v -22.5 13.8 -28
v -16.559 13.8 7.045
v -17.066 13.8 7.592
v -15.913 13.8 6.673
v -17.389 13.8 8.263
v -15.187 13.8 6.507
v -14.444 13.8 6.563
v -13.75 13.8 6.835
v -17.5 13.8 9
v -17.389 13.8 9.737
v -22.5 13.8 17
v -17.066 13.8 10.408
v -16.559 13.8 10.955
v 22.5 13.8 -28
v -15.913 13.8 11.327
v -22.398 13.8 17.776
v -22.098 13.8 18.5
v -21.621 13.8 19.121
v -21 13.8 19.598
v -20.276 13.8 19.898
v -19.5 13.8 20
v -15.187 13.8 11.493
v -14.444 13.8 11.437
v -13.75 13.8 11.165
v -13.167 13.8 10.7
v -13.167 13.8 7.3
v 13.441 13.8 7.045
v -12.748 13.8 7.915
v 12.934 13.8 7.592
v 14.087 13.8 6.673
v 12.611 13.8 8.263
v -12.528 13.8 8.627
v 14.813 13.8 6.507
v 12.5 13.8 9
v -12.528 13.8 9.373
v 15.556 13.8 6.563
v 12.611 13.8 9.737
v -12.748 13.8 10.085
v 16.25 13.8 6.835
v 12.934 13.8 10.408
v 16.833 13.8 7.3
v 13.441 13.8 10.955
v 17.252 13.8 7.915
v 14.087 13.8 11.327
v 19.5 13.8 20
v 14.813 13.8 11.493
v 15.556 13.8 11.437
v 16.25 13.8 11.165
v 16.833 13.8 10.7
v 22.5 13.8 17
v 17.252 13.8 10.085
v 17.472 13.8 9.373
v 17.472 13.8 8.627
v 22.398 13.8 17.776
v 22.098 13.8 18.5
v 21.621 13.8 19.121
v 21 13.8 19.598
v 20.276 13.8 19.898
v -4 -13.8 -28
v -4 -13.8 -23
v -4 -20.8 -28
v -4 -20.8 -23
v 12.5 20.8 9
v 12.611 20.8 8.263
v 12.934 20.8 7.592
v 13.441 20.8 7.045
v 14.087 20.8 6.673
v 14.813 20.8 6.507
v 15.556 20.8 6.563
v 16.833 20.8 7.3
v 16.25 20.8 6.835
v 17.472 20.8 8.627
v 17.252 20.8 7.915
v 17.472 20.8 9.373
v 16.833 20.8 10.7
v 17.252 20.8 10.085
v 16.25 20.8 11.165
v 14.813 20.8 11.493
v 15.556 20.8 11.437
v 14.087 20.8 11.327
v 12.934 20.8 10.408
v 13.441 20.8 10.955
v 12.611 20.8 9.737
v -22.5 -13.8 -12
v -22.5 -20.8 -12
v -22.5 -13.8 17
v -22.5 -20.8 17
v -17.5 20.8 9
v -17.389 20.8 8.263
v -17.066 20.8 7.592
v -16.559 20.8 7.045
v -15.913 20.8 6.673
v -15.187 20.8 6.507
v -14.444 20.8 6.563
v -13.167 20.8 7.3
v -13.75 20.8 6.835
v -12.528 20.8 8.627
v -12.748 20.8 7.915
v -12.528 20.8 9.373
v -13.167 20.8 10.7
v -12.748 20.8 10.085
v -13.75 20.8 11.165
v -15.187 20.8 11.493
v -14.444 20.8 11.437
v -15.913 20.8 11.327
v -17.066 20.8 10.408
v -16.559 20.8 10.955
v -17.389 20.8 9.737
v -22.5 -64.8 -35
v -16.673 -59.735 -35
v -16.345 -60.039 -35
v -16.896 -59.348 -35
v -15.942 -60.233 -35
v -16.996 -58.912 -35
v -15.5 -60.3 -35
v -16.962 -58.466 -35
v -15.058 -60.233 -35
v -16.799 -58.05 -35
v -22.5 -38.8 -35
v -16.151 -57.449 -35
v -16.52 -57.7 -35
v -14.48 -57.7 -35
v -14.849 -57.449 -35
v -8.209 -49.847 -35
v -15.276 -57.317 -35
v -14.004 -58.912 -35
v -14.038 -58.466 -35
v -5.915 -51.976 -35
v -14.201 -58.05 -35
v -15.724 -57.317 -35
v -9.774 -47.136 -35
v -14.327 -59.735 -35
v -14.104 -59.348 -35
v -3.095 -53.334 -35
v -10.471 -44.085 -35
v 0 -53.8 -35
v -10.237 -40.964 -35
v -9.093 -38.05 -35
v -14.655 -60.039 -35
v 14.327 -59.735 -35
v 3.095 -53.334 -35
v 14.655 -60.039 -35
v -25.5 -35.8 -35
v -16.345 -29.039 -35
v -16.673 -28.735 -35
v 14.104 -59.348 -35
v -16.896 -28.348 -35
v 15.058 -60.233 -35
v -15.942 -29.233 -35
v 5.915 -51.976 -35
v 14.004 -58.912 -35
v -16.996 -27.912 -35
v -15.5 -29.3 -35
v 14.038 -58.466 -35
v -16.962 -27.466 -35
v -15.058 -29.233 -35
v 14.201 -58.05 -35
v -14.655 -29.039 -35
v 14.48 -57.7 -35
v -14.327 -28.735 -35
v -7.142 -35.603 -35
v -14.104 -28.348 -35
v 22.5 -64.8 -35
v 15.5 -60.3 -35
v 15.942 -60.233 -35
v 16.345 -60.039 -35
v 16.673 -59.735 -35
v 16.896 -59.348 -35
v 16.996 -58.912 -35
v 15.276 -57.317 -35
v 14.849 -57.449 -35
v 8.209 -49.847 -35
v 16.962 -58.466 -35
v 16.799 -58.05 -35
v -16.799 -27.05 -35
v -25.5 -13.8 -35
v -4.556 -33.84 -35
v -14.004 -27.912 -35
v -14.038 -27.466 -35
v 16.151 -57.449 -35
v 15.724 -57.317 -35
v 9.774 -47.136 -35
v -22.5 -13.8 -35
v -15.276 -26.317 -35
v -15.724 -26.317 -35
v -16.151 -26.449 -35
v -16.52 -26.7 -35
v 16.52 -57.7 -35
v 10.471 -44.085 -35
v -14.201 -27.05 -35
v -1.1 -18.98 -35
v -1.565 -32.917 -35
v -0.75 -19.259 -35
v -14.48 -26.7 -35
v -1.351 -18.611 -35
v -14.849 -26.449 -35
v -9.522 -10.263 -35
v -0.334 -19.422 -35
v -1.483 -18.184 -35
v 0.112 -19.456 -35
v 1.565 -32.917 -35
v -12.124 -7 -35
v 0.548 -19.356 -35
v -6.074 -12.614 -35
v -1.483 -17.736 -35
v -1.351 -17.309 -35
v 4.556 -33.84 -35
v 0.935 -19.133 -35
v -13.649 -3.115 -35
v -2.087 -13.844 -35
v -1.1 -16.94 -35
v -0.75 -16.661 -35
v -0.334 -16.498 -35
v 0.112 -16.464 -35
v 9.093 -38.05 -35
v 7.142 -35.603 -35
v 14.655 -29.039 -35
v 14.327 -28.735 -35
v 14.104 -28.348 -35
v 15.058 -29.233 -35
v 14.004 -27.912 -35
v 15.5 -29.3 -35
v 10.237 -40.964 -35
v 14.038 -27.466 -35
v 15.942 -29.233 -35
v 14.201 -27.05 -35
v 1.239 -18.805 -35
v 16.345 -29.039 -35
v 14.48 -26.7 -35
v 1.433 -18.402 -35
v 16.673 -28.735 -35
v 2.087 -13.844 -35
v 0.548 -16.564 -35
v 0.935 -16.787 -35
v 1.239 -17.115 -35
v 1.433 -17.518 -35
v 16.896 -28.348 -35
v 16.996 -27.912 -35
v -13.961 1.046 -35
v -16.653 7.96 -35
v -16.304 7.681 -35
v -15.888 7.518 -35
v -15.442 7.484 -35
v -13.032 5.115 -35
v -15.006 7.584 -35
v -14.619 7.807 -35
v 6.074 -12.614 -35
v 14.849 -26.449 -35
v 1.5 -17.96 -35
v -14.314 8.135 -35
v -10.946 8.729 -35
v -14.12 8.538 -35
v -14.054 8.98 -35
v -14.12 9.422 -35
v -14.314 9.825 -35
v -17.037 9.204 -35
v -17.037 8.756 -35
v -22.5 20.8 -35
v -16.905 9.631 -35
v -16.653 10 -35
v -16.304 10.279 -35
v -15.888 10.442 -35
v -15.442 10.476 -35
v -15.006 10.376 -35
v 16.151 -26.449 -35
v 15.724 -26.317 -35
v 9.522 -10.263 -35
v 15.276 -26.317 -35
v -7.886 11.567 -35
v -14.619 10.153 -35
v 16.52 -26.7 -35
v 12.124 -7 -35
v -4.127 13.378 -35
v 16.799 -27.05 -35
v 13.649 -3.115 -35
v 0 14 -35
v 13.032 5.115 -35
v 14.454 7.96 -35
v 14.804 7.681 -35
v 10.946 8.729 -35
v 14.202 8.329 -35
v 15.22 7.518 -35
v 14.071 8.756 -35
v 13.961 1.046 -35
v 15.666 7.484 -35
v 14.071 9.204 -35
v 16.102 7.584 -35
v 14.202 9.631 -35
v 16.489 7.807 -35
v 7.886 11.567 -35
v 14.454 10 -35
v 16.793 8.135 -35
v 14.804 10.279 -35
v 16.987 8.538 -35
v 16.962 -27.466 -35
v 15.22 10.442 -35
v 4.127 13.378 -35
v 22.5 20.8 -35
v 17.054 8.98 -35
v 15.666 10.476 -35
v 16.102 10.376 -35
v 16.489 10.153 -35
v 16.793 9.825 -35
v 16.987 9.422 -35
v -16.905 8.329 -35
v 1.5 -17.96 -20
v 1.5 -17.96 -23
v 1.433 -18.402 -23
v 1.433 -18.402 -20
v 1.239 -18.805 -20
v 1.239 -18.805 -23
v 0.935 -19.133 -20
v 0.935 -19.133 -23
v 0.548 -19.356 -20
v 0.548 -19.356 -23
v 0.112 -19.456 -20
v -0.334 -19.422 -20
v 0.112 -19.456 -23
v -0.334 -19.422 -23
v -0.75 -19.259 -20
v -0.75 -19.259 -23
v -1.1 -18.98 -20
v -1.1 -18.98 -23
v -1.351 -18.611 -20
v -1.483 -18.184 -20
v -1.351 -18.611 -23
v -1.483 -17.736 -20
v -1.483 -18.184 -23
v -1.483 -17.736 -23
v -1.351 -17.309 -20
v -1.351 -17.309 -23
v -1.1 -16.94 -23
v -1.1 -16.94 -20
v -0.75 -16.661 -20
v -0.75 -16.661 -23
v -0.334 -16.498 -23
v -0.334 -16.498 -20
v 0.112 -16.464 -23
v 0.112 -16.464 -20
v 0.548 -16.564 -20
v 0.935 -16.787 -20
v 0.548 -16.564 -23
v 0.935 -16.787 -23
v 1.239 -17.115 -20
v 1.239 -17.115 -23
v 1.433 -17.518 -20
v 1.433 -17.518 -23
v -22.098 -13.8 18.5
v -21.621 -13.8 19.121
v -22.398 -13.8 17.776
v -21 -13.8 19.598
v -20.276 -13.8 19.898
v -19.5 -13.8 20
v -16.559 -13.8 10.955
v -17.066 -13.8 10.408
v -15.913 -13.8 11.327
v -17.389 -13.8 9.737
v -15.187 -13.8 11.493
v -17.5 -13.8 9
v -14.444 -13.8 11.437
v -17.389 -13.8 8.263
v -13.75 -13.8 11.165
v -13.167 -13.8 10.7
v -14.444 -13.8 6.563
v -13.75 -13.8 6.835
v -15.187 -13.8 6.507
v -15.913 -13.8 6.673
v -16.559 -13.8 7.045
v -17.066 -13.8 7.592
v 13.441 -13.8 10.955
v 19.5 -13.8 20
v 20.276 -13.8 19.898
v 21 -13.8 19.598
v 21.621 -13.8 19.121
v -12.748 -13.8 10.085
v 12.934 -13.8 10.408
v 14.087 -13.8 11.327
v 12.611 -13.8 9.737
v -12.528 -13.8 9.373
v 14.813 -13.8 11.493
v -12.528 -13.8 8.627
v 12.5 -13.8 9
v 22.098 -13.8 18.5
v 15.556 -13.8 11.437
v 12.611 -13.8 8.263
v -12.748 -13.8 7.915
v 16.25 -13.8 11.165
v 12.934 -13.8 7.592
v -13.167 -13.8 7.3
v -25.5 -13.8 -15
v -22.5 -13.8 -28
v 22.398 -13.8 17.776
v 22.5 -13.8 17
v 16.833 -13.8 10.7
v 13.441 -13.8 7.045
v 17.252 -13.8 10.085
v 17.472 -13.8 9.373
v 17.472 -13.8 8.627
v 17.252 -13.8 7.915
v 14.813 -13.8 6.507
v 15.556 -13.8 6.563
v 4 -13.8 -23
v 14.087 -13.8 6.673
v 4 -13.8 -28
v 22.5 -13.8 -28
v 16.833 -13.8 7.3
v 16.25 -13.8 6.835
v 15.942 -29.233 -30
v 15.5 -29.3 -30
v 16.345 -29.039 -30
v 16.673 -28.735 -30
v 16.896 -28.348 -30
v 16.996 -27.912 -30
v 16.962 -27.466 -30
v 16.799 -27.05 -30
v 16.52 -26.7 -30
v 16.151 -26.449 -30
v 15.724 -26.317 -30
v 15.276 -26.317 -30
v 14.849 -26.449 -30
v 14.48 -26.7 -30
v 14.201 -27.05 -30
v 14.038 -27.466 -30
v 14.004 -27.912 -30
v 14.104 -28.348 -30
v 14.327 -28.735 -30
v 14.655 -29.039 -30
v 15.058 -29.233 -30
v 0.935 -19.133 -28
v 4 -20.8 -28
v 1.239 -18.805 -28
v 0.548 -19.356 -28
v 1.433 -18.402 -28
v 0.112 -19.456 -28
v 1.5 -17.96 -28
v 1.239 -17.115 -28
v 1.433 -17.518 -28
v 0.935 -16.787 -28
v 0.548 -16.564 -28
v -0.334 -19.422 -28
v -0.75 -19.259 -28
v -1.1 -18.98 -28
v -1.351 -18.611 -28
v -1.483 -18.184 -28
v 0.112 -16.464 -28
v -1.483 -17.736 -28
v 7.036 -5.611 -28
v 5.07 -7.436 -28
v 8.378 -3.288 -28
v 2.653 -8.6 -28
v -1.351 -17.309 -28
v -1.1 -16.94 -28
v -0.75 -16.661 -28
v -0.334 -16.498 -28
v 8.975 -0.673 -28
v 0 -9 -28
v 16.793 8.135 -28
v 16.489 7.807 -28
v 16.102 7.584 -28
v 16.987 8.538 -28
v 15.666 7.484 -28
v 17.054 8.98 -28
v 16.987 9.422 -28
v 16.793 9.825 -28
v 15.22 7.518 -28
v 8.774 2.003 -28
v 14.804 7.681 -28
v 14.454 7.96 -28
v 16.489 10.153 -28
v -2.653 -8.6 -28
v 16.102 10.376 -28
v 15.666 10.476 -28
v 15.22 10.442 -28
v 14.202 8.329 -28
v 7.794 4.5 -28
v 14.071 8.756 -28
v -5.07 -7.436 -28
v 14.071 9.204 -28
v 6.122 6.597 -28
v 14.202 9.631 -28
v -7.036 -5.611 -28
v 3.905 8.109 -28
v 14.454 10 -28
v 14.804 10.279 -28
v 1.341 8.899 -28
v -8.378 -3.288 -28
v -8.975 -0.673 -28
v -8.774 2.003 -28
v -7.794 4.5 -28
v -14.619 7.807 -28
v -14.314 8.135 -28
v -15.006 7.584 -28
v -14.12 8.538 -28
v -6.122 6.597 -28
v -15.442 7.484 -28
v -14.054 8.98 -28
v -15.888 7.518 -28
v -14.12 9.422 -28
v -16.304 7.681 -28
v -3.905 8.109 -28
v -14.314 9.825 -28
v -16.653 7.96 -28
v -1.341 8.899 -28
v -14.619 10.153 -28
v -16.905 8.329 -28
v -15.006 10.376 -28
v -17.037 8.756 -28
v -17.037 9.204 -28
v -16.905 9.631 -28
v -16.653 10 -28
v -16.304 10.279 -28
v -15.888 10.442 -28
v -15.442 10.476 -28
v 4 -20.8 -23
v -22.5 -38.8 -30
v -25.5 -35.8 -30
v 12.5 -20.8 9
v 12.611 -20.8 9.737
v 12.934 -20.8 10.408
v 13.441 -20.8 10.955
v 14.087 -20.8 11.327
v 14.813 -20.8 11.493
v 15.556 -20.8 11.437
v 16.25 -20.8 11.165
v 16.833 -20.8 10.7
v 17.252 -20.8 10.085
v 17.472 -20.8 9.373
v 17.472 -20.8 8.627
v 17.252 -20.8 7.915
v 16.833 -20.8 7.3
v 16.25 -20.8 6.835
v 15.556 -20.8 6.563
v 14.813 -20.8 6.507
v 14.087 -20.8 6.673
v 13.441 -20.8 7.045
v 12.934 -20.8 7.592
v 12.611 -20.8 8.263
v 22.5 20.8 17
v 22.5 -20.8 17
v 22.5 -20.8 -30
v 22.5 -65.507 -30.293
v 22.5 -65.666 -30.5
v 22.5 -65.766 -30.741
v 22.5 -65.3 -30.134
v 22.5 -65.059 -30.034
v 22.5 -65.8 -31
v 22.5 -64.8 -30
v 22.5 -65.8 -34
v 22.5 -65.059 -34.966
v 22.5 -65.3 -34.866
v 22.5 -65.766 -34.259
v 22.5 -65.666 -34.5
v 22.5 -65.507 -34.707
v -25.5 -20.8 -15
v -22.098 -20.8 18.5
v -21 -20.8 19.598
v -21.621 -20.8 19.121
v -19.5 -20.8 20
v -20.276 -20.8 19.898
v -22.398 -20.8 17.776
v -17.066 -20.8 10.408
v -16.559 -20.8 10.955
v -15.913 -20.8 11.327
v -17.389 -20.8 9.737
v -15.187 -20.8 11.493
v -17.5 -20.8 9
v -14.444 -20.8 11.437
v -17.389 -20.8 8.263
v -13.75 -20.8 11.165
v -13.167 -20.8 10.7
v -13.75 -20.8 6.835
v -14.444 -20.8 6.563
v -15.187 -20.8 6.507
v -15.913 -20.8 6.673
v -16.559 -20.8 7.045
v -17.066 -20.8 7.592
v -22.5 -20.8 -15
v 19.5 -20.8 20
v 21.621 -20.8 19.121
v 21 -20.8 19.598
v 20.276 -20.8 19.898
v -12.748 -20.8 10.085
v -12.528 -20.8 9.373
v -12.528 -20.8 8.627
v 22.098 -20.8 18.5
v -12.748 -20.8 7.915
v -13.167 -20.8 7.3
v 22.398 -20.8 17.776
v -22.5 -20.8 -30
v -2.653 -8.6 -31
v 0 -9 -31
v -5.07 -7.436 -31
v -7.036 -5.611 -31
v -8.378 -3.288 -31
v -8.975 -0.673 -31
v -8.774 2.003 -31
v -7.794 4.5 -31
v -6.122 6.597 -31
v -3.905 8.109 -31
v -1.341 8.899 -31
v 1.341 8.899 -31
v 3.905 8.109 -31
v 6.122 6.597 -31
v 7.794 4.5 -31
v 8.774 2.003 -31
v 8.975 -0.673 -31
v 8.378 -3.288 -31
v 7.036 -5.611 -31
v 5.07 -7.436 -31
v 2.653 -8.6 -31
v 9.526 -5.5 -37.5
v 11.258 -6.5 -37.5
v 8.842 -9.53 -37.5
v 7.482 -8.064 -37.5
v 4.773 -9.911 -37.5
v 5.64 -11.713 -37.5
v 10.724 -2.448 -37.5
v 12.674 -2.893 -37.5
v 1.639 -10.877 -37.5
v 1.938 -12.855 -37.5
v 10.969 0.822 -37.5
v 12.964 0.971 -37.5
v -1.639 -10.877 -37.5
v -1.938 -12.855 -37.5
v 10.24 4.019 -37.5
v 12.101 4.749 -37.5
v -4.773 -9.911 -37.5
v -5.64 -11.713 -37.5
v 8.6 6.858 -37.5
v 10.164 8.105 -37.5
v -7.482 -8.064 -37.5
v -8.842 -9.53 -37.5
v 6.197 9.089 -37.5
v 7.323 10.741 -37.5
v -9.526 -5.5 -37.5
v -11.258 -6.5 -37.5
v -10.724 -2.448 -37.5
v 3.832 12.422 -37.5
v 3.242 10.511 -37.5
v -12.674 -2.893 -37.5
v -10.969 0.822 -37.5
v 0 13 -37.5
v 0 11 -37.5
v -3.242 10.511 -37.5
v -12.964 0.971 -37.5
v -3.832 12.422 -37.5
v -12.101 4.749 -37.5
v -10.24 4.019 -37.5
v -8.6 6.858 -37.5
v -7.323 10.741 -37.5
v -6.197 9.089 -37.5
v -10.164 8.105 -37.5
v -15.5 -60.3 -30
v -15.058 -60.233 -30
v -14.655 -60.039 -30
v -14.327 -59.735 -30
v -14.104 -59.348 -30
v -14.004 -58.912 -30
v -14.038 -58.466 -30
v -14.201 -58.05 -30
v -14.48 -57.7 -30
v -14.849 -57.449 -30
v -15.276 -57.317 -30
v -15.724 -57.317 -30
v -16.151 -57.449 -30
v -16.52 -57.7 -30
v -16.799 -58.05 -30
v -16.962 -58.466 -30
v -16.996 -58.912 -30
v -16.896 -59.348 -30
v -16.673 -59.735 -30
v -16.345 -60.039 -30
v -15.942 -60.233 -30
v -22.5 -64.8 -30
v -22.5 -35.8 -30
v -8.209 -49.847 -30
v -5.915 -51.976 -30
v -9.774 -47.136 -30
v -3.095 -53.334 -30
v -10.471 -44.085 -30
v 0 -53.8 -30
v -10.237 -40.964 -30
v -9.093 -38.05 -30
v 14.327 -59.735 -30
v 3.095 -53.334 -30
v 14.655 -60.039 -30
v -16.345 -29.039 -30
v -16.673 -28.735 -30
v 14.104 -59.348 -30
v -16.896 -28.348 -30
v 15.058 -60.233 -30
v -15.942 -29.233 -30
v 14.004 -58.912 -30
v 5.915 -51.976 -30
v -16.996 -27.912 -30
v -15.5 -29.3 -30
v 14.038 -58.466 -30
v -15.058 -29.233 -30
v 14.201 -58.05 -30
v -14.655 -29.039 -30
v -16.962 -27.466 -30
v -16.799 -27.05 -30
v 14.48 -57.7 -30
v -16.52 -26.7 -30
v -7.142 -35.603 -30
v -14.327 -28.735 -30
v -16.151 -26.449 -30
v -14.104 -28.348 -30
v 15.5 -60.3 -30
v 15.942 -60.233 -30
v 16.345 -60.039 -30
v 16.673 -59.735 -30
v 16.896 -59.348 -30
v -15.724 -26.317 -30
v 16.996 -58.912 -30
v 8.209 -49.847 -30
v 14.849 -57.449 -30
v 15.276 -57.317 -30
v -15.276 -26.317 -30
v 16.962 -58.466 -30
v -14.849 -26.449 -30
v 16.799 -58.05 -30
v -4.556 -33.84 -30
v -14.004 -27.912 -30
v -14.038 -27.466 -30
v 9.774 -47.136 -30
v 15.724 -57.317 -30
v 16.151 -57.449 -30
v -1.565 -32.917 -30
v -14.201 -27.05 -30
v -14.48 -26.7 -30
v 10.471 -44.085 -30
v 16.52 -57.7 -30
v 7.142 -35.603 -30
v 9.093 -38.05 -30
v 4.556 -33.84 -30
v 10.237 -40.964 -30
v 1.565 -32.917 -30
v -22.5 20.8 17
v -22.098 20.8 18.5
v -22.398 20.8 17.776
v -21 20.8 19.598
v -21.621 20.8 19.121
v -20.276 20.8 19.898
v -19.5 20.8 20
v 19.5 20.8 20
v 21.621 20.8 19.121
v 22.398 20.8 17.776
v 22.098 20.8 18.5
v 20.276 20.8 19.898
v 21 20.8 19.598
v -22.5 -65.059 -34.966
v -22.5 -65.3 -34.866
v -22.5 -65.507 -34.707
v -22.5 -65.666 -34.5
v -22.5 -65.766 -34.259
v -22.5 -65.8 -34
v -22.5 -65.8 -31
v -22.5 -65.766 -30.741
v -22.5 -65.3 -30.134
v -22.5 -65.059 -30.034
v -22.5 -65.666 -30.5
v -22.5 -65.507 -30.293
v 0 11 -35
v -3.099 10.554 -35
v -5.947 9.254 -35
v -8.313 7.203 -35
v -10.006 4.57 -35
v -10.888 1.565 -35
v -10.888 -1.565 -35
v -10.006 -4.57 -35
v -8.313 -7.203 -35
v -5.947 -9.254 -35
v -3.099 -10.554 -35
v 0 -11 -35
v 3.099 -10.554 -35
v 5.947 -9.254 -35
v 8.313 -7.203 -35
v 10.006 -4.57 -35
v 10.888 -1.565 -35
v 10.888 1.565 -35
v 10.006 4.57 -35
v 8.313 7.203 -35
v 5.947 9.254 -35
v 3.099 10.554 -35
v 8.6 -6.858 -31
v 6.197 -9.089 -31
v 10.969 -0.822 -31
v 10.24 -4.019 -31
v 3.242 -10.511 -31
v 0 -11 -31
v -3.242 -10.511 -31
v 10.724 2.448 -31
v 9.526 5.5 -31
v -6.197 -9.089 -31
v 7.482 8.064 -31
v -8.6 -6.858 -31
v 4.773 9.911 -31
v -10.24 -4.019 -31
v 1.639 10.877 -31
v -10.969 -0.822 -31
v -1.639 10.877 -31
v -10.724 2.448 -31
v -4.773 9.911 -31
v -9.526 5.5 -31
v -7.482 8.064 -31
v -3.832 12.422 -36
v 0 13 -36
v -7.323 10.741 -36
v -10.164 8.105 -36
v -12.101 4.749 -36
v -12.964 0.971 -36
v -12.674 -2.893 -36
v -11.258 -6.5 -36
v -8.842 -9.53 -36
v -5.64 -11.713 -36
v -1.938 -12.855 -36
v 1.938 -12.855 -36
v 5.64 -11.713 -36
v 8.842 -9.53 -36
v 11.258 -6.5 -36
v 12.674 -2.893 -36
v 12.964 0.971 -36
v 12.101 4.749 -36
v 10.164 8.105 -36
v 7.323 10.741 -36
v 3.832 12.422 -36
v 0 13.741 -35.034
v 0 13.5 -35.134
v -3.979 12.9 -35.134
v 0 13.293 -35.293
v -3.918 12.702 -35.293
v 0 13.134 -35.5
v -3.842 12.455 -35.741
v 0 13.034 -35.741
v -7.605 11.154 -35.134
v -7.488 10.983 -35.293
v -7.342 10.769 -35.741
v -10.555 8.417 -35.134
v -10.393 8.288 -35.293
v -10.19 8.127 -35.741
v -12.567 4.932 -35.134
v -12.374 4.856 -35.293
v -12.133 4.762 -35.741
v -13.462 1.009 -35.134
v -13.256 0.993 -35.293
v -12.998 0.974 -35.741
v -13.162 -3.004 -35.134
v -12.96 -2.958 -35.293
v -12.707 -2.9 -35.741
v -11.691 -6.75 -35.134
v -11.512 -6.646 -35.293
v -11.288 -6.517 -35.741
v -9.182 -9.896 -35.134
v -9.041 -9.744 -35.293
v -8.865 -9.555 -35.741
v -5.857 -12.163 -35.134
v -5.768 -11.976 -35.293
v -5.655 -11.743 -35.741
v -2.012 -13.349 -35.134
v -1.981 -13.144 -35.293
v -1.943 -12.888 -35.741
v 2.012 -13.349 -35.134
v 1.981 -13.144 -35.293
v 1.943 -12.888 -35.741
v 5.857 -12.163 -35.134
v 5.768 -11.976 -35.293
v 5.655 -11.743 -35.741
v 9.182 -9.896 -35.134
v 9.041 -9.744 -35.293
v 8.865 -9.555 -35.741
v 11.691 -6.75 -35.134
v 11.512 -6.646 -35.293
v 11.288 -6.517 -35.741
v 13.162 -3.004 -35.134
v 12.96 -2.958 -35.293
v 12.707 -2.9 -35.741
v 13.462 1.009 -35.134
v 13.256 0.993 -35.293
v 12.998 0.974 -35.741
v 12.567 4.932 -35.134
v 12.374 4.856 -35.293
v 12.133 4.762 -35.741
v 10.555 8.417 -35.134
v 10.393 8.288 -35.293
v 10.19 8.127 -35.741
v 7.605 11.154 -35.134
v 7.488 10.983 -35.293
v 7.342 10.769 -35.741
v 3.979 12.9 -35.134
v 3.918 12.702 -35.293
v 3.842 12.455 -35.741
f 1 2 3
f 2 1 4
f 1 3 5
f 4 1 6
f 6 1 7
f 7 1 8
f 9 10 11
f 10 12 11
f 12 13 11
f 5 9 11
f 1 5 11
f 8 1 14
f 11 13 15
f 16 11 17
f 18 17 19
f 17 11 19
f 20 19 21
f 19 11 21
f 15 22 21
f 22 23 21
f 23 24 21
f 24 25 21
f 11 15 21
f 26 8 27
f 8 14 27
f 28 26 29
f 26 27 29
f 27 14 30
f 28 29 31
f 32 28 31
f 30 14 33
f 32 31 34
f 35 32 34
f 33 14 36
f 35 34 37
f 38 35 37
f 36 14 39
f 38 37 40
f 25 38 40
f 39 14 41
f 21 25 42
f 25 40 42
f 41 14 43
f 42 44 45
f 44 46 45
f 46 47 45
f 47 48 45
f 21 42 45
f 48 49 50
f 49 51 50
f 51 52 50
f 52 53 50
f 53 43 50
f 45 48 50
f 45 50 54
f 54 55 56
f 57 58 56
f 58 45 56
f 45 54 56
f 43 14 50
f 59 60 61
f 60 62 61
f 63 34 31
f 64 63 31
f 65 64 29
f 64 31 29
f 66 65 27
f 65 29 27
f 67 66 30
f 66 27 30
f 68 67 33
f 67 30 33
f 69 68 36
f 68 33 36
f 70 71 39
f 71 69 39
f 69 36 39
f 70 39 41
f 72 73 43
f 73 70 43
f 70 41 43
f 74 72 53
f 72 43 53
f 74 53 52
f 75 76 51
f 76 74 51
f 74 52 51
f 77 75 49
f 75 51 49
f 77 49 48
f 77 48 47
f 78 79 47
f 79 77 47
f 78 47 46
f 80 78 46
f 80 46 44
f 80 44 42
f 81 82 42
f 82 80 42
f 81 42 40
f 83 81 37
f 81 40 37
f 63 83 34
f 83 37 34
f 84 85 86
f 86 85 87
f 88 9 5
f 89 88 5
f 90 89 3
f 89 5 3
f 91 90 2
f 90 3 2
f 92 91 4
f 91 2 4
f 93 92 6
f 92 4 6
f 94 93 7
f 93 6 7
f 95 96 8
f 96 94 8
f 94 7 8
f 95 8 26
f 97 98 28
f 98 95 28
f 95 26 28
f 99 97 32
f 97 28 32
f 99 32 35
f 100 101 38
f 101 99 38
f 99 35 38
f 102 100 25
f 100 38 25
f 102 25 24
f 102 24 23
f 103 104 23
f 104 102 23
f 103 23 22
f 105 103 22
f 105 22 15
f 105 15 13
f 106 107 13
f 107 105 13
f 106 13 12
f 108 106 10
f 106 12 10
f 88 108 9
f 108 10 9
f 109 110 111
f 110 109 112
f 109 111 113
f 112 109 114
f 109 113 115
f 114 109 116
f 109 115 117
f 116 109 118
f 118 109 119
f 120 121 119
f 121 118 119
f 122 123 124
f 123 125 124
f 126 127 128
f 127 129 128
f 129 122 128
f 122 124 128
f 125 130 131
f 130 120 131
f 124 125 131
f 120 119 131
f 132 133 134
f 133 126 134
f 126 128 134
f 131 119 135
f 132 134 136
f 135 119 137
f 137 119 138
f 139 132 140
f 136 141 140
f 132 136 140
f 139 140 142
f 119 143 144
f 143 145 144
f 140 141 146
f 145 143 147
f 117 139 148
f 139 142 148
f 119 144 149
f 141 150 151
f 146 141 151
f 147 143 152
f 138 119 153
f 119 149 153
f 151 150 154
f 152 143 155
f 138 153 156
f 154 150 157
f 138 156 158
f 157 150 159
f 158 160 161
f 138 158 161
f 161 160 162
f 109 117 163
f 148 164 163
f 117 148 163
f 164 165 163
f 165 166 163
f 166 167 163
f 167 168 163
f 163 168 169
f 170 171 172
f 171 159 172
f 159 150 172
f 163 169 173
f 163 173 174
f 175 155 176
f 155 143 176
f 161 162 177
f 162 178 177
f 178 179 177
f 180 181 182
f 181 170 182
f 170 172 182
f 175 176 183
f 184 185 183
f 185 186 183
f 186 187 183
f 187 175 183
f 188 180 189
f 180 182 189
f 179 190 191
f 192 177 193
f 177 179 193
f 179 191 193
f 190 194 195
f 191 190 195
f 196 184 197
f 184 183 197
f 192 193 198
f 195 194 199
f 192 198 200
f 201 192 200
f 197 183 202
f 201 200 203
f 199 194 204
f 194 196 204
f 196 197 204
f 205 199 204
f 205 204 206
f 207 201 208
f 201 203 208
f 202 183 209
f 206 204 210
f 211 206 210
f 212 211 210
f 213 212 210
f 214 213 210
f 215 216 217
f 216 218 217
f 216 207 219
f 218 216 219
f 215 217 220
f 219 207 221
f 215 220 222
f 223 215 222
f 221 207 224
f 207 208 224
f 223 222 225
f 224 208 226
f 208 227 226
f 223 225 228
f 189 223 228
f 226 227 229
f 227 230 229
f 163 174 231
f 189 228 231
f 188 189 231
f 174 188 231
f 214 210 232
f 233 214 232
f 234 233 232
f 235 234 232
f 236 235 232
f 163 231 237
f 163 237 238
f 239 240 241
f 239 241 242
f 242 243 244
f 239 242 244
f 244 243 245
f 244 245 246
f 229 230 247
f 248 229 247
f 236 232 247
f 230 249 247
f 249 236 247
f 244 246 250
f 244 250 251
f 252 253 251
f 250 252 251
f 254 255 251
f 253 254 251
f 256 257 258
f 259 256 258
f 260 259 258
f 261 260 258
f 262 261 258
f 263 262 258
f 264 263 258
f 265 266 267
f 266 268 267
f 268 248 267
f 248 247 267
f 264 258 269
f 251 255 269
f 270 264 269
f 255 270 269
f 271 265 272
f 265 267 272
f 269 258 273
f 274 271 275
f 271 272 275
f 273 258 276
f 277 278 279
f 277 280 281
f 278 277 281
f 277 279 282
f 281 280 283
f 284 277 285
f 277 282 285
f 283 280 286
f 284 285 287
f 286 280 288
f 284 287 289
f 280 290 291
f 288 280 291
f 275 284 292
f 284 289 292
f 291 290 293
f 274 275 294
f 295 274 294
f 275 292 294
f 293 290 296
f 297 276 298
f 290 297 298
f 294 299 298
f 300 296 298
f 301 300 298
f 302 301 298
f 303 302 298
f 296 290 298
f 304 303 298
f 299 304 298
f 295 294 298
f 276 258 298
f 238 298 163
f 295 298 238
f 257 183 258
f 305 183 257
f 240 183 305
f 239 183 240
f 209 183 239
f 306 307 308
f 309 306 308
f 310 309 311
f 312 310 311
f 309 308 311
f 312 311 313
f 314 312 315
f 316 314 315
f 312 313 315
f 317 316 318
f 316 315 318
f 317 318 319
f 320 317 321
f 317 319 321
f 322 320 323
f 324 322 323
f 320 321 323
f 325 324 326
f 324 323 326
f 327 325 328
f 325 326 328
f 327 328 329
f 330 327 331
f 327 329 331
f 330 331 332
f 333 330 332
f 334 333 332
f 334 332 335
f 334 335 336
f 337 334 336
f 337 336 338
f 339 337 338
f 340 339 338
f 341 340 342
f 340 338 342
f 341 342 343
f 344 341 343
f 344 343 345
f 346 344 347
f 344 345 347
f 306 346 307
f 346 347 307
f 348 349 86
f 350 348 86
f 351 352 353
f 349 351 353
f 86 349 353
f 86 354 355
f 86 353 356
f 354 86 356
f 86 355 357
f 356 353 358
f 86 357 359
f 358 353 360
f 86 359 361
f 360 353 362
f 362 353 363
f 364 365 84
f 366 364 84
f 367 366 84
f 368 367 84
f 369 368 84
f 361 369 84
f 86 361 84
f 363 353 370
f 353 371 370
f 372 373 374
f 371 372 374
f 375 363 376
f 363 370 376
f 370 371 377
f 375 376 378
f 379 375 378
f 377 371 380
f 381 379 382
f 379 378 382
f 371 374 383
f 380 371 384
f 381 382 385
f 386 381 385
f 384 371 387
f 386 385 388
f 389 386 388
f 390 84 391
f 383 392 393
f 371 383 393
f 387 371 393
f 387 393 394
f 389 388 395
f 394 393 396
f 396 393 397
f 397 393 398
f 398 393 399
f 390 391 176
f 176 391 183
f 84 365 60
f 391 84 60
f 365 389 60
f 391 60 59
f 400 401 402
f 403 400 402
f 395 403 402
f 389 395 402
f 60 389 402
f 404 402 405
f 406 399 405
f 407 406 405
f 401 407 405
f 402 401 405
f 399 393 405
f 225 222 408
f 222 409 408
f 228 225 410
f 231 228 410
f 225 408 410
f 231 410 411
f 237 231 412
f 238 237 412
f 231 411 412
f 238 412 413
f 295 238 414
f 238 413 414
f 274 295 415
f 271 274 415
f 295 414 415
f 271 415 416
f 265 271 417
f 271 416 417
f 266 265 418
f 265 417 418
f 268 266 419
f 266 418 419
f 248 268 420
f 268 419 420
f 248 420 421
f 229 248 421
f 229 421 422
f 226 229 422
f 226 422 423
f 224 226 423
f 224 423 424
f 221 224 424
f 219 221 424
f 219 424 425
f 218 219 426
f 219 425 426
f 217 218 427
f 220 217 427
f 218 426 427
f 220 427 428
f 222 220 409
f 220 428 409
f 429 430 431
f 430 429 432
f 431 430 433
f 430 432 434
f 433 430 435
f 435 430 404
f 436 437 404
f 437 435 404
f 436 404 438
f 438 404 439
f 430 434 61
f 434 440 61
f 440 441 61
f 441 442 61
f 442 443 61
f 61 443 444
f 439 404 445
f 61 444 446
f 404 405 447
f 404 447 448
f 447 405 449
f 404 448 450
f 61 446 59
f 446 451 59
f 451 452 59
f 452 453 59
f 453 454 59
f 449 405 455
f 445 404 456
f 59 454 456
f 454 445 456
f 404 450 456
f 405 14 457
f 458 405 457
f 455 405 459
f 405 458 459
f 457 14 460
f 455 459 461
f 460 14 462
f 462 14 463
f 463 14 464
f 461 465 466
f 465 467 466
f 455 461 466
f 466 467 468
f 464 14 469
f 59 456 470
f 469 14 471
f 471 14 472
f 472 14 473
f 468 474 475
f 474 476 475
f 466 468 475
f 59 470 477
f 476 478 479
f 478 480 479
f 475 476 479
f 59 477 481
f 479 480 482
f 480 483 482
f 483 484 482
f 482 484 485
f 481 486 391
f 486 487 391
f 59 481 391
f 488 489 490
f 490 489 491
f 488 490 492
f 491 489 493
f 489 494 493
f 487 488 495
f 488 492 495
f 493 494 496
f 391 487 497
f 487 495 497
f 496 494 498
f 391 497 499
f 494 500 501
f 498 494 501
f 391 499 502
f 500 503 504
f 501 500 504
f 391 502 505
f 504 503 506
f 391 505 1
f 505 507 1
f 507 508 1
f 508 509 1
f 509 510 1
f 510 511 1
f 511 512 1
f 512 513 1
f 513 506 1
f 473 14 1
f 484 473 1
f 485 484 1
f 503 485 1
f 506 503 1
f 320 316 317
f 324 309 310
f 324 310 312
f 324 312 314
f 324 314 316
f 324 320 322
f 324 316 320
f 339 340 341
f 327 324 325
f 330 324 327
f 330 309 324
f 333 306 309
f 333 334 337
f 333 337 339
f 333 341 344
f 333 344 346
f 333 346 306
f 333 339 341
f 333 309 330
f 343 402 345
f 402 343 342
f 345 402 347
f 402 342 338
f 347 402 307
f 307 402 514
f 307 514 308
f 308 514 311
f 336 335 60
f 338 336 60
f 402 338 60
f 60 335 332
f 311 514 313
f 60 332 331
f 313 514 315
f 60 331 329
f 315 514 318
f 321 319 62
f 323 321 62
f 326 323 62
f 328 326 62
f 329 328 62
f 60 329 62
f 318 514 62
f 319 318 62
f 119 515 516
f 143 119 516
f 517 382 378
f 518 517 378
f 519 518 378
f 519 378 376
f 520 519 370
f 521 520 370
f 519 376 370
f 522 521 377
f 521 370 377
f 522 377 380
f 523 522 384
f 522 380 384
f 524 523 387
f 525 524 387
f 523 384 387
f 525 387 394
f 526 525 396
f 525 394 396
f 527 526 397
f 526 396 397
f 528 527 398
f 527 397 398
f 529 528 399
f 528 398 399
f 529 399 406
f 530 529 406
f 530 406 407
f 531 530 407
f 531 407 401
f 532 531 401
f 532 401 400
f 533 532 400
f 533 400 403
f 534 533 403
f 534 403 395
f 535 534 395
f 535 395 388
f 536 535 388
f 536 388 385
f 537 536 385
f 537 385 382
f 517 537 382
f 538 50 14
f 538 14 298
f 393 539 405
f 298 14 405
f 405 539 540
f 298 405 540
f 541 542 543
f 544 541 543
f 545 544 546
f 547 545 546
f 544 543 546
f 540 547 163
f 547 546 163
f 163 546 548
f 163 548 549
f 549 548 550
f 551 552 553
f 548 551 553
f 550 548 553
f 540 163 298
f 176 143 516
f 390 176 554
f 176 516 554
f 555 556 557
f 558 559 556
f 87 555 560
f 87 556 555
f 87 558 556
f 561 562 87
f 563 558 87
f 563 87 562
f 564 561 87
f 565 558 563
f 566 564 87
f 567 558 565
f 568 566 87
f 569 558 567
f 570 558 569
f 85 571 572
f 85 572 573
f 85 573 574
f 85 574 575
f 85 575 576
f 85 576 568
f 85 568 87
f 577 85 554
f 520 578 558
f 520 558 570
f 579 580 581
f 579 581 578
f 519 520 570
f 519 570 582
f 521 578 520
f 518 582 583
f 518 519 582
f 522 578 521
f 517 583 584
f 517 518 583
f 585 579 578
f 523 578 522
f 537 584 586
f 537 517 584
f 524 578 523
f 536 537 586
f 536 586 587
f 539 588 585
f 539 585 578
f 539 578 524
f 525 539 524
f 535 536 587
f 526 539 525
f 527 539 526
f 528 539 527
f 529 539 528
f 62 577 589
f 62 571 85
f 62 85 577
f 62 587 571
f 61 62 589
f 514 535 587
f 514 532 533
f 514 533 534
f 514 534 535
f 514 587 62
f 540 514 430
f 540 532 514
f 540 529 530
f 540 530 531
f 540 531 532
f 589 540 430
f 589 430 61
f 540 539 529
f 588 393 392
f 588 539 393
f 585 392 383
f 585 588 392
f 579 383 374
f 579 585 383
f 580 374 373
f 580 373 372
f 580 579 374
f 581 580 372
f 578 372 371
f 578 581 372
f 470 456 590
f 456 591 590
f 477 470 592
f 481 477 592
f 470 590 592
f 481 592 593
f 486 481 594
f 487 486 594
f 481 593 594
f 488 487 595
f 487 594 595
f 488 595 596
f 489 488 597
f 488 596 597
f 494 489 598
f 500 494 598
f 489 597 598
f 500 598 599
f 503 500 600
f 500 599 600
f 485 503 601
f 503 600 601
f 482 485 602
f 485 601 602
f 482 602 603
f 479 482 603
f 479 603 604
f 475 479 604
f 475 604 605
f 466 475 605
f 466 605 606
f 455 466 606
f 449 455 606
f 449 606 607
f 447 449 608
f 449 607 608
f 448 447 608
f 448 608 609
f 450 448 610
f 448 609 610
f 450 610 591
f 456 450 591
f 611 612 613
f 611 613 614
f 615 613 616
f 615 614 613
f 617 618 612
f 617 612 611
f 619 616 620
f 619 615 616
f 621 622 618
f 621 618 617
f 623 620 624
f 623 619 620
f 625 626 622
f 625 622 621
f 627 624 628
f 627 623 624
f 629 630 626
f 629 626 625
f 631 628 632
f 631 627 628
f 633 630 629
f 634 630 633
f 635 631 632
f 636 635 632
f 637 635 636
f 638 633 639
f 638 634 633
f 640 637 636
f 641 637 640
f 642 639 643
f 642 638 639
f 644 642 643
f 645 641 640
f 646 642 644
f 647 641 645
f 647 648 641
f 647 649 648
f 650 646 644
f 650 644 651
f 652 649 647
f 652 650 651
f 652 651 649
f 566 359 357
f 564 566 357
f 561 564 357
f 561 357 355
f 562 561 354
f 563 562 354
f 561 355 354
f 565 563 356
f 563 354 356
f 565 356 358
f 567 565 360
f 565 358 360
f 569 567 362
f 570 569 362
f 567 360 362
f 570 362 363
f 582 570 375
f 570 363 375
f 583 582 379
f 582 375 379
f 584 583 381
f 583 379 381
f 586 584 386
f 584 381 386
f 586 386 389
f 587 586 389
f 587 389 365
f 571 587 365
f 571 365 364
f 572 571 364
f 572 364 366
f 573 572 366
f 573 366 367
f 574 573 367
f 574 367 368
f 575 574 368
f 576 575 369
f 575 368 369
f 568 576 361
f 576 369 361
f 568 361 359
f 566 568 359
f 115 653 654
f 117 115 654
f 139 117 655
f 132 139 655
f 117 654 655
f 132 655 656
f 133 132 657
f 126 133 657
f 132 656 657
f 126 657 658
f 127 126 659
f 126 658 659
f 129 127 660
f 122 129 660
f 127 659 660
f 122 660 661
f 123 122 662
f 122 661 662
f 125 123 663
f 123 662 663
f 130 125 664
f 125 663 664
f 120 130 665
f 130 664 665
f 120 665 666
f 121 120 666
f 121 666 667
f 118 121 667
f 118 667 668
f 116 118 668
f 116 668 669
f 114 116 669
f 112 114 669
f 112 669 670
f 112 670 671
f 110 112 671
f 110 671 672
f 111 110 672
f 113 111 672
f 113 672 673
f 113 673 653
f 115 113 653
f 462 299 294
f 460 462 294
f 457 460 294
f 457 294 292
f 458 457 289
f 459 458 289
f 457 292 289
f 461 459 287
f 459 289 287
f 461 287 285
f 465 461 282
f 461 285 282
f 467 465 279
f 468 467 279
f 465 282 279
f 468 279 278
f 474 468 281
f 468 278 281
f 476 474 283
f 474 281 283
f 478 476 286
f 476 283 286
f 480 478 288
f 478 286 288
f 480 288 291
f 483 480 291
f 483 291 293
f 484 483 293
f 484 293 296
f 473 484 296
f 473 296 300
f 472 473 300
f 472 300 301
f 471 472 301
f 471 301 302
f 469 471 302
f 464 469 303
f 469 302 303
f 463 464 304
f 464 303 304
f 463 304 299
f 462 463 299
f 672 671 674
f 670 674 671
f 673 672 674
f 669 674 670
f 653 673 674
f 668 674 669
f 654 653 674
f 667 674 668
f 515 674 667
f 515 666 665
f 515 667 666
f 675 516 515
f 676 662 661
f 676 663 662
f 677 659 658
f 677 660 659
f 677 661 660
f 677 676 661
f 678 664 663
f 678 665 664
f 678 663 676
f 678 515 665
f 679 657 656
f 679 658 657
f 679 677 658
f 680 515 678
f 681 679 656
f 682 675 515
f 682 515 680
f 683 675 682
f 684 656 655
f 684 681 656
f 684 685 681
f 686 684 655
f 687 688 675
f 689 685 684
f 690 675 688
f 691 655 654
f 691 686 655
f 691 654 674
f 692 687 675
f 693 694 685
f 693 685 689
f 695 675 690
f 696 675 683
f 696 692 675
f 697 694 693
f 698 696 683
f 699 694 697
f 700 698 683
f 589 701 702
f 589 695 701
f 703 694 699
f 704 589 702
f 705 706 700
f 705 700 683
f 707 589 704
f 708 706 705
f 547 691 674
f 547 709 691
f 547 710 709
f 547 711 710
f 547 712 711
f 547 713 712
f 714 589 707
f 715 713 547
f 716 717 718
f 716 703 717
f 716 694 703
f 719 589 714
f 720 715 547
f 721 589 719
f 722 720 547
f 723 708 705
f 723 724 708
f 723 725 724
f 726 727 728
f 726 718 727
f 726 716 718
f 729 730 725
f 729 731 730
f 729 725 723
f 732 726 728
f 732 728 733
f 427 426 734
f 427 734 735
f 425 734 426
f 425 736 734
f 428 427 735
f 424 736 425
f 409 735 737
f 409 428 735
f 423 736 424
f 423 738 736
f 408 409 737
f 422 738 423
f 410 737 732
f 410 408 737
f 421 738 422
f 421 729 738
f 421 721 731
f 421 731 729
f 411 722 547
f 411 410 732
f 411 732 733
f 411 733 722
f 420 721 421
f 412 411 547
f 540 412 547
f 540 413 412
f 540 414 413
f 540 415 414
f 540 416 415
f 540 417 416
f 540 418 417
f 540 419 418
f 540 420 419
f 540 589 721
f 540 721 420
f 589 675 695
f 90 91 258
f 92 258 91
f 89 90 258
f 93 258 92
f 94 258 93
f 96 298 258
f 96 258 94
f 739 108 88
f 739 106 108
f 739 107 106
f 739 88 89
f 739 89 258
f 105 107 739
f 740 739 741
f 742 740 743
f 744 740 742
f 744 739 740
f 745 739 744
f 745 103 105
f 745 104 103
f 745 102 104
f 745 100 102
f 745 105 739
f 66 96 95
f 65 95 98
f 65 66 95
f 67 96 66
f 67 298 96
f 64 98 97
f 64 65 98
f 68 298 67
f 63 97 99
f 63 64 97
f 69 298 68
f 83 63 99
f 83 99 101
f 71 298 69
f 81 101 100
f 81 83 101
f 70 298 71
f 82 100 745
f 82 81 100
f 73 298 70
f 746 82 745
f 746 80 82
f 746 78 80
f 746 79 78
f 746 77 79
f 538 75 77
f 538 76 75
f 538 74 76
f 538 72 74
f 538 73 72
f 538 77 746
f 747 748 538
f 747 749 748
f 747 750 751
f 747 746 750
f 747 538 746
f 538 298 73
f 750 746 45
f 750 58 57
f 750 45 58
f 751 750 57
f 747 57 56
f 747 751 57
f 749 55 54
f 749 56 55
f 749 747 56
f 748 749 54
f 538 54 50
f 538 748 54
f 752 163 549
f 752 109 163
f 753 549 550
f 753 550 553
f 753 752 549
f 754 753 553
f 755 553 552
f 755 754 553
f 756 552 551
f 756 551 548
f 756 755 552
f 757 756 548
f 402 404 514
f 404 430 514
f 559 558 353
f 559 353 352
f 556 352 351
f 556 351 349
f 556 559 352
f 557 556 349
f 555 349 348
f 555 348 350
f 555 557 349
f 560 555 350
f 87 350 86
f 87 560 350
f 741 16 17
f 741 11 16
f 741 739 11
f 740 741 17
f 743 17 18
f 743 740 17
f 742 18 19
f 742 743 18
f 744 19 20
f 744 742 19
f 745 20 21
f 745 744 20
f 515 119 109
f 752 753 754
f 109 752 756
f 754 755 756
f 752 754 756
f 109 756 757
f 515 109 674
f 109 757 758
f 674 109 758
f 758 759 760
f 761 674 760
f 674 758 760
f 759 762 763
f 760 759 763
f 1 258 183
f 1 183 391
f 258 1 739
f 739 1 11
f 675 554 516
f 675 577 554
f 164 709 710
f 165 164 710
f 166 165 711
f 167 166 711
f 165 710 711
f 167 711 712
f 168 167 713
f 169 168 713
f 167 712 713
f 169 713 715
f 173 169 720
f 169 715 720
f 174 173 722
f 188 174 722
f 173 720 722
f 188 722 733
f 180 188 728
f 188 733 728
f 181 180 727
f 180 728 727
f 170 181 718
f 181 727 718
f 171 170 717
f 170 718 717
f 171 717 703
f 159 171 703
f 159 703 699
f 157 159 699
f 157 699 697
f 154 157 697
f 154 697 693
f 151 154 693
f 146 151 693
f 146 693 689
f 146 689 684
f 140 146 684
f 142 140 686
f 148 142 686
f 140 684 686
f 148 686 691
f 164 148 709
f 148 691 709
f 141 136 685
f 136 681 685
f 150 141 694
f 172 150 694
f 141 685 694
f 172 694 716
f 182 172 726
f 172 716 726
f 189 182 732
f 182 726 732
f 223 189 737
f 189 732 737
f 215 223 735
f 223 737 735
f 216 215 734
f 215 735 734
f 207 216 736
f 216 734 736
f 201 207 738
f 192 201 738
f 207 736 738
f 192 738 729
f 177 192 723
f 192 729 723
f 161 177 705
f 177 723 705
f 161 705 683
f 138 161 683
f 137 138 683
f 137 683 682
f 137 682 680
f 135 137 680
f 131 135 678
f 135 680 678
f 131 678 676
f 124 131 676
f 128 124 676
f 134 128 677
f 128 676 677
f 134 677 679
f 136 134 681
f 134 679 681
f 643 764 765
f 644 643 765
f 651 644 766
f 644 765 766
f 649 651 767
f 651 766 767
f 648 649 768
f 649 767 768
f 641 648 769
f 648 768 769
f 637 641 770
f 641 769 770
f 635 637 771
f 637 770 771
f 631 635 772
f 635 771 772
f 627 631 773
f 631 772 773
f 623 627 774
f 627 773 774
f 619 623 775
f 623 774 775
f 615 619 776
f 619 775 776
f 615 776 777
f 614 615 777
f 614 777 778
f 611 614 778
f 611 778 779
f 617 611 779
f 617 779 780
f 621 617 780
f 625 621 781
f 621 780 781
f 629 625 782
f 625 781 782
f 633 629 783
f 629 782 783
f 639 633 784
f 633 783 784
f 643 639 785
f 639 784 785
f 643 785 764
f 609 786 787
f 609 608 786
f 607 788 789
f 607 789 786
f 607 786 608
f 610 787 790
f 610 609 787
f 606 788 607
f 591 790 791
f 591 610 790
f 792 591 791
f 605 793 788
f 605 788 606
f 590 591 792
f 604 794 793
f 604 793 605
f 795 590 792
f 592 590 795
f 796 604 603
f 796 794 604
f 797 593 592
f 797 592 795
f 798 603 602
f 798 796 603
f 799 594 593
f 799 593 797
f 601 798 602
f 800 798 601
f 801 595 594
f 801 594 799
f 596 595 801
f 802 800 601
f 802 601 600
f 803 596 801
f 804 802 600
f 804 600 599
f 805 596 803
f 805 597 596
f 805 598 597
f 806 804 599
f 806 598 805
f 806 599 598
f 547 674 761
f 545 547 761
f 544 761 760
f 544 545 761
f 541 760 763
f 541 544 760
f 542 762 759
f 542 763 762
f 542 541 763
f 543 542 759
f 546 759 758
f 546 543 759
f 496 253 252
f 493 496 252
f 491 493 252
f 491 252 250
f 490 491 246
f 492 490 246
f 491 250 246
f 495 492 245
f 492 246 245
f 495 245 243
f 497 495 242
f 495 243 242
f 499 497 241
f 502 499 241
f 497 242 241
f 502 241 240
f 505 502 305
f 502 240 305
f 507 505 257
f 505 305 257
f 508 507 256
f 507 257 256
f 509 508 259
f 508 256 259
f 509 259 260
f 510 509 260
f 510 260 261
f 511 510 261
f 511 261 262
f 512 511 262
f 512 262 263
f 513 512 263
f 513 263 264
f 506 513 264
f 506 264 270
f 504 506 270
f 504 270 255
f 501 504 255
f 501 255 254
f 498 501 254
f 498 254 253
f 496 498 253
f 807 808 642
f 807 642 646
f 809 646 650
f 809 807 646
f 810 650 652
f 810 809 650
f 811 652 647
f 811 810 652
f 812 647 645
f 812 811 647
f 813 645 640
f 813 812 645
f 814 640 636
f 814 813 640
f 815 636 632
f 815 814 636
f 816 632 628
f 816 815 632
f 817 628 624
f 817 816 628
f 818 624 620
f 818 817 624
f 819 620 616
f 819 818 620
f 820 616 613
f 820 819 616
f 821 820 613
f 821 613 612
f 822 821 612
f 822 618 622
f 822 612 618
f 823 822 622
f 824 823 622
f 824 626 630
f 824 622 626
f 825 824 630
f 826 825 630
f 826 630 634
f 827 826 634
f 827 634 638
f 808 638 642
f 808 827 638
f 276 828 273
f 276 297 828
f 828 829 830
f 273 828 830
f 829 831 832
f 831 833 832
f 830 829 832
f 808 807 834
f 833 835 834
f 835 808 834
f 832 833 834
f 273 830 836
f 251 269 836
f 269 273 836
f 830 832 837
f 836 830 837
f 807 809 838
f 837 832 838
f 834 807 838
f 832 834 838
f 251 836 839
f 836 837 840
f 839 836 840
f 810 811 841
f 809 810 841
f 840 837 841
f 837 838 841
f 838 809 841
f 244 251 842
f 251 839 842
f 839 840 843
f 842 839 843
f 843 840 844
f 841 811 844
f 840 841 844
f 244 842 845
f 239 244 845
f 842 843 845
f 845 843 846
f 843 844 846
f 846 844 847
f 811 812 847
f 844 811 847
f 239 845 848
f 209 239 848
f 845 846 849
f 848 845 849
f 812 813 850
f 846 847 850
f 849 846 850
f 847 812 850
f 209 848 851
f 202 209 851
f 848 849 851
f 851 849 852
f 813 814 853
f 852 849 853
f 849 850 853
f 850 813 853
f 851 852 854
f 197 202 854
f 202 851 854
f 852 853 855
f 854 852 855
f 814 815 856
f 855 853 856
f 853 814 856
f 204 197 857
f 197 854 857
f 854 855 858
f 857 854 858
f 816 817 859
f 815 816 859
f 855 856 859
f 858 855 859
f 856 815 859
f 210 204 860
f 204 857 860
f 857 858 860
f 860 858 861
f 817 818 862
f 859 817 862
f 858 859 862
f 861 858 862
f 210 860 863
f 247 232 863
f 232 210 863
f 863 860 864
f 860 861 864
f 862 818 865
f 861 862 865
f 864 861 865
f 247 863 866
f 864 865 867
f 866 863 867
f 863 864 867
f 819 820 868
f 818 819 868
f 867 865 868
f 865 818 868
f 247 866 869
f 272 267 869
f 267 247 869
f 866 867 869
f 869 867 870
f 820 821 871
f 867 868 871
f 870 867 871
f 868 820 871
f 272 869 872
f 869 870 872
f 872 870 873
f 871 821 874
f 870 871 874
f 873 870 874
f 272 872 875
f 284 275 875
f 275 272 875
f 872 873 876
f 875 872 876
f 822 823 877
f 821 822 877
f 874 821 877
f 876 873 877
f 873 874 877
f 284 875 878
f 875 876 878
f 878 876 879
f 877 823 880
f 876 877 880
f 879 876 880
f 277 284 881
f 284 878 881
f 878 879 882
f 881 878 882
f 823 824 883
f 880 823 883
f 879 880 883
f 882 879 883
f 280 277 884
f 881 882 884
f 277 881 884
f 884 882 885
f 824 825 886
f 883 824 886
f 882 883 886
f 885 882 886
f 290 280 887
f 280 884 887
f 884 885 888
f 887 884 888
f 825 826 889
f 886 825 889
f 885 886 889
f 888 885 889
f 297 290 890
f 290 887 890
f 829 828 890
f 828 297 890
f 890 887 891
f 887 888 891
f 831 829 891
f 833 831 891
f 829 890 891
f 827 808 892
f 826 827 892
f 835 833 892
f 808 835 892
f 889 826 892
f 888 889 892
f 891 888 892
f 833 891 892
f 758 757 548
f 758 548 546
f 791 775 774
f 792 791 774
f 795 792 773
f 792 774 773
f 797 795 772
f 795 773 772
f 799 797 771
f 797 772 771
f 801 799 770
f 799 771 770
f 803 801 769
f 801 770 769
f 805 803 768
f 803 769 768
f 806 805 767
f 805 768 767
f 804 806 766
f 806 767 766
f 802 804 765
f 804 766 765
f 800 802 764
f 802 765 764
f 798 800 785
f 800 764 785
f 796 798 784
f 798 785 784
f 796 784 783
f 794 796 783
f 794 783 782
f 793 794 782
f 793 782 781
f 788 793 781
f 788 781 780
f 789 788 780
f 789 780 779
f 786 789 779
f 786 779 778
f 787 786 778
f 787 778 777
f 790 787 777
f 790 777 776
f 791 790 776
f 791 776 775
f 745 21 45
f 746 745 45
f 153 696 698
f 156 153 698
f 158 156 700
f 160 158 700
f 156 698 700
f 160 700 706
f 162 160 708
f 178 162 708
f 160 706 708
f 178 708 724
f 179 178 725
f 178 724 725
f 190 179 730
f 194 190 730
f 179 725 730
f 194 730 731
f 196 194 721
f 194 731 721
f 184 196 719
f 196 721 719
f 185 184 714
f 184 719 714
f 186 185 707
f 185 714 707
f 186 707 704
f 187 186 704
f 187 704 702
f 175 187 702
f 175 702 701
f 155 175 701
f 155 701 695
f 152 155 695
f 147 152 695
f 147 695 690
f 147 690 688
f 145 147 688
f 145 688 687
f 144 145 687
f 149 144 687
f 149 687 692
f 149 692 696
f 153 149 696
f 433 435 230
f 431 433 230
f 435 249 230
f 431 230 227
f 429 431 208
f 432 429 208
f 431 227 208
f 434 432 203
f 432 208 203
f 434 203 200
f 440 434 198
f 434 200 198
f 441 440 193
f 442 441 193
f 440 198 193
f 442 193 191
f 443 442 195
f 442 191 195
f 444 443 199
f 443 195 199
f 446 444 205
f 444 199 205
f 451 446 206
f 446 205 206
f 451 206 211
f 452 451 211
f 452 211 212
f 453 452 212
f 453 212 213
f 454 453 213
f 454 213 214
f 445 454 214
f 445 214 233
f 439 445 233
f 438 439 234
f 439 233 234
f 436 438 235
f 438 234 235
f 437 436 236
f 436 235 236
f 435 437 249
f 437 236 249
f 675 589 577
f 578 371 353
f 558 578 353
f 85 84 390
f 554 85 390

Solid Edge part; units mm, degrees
sketch "Sketch1" plane through (0, 13.8, 0) normal (0, 1, 0) x (-1, 0, 0)
  line L0 (-22.5, 20) -> (-22.5, -20)
  line L1 (-22.5, -20) -> (-22.5, -28)
  line L2 (-22.5, -28) -> (22.5, -28)
  line L3 (22.5, -28) -> (22.5, -20)
  line L4 (22.5, -20) -> (22.5, 20)
  line L5 (22.5, 20) -> (-22.5, 20)
  circle A0 centre (-15, 9) radius 2.5
  circle A1 centre (15, 9) radius 2.5
extrude "ExtrudedProtrusion_1" add sketch "Sketch1" along normal blind 7
mirror "Mirror1" about plane through (0, 0, 0) normal (0, -1, 0) of "ExtrudedProtrusion_1"
sketch "Sketch2" plane through (0, 20.8, -4) normal (0, 1, 0) x (-1, 0, 0)
  line L0 (-22.5, -24) -> (22.5, -24)
  line L1 (22.5, -24) -> (22.5, -31)
  line L2 (22.5, -31) -> (-22.5, -31)
  line L3 (-22.5, -31) -> (-22.5, -24)
extrude "ExtrudedProtrusion_3" add sketch "Sketch2" against normal blind 41.6
sketch "Sketch3" plane through (0, 0, -35) normal (0, 0, -1) x (1, 0, 0)
  circle A0 centre (0, 0) radius 2.5
extrude "ExtrudedCutout_1" cut sketch "Sketch3" against normal blind 32
fillet "Round_2" radius 3 4 edges at (22.5, -17.3, 20) (-22.5, -17.3, 20) (22.5, 17.3, 20) (-22.5, 17.3, 20)
sketch "Sketch4" plane through (0, -20.8, -7.5) normal (0, -1, 0) x (-1, 0, 0)
  line L0 (-22.5, 27.5) -> (22.5, 27.5)
  line L1 (22.5, 27.5) -> (22.5, 22.5)
  line L2 (22.5, 22.5) -> (-22.5, 22.5)
  line L3 (-22.5, 22.5) -> (-22.5, 27.5)
extrude "ExtrudedProtrusion_4" add sketch "Sketch4" along normal blind 45
sketch "Sketch5" plane through (0, -43.3, -30) normal (0, 0, 1) x (0, -1, 0)
  circle A0 centre (0, 0) radius 10.5
  circle A1 centre (-15.5, 15.5) radius 1.5
  circle A2 centre (15.5, 15.5) radius 1.5
  circle A3 centre (15.5, -15.5) radius 1.5
  circle A4 centre (-15.5, -15.5) radius 1.5
extrude "ExtrudedCutout_2" cut sketch "Sketch5" against normal blind 29.9875
fillet "Round_3" radius 1 2 edges at (0, -65.8, -30) (0, -65.8, -35)
sketch "Sketch6" plane through (0, -22, -35) normal (0, 0, -1) x (0, -1, 0)
  circle A0 centre (-22, 0) radius 11
extrude "ExtrudedCutout_3" cut sketch "Sketch6" against normal blind 4
sketch "Sketch7" plane through (0, 0, -31) normal (0, 0, -1) x (0, -1, 0)
  circle A0 centre (0, 0) radius 9
extrude "ExtrudedCutout_4" cut sketch "Sketch7" against normal blind 20
sketch "Sketch8" plane through (0, -22, -35) normal (0, 0, -1) x (1, 0, 0)
  circle A0 centre (0, -4.04) radius 1.5
  circle A1 centre (-15.5538, -30.98) radius 1.5
  circle A2 centre (15.5538, -30.98) radius 1.5
extrude "ExtrudedCutout_5" cut sketch "Sketch8" against normal blind 15
sketch "Sketch9" plane through (0, -20.8, -5) normal (0, -1, 0) x (1, 0, 0)
  line L0 (4, -23) -> (4, -18)
  line L1 (4, -18) -> (-4, -18)
  line L2 (-4, -18) -> (-4, -23)
  line L3 (-4, -23) -> (4, -23)
extrude "ExtrudedCutout_6" cut sketch "Sketch9" against normal blind 10
sketch "Sketch10" plane through (0, -22, -35) normal (0, 0, -1) x (0, 1, 0)
  circle A0 centre (22, 0) radius 11
  circle A1 centre (22, 0) radius 13
extrude "ExtrudedProtrusion_5" add sketch "Sketch10" along normal blind 2.5
fillet "Round_4" radius 1 1 edges at (0, -13, -35)
sketch "Sketch11" plane through (-22.5, -22.5, -9) normal (-1, 0, 0) x (0, 1, 0)
  line L0 (1.7, 6) -> (-13.3, 21)
  line L1 (-13.3, 21) -> (-13.3, 26)
  line L2 (-13.3, 26) -> (8.7, 26)
  line L3 (8.7, 26) -> (8.7, 6)
  line L4 (1.7, 6) -> (8.7, 6)
extrude "ExtrudedProtrusion_6" add sketch "Sketch11" along normal blind 3
chamfer "Chamfer_1" distance 3 angle 45 1 edges at (-22.5, -17.3, -15) measured on face at (-24.97, -19.7033, -15)
chamfer "Chamfer_2" distance 3 angle 45 1 edges at (-22.5, -35.8, -32.5) measured on face at (-24.97, -35.8, -30.7833)
